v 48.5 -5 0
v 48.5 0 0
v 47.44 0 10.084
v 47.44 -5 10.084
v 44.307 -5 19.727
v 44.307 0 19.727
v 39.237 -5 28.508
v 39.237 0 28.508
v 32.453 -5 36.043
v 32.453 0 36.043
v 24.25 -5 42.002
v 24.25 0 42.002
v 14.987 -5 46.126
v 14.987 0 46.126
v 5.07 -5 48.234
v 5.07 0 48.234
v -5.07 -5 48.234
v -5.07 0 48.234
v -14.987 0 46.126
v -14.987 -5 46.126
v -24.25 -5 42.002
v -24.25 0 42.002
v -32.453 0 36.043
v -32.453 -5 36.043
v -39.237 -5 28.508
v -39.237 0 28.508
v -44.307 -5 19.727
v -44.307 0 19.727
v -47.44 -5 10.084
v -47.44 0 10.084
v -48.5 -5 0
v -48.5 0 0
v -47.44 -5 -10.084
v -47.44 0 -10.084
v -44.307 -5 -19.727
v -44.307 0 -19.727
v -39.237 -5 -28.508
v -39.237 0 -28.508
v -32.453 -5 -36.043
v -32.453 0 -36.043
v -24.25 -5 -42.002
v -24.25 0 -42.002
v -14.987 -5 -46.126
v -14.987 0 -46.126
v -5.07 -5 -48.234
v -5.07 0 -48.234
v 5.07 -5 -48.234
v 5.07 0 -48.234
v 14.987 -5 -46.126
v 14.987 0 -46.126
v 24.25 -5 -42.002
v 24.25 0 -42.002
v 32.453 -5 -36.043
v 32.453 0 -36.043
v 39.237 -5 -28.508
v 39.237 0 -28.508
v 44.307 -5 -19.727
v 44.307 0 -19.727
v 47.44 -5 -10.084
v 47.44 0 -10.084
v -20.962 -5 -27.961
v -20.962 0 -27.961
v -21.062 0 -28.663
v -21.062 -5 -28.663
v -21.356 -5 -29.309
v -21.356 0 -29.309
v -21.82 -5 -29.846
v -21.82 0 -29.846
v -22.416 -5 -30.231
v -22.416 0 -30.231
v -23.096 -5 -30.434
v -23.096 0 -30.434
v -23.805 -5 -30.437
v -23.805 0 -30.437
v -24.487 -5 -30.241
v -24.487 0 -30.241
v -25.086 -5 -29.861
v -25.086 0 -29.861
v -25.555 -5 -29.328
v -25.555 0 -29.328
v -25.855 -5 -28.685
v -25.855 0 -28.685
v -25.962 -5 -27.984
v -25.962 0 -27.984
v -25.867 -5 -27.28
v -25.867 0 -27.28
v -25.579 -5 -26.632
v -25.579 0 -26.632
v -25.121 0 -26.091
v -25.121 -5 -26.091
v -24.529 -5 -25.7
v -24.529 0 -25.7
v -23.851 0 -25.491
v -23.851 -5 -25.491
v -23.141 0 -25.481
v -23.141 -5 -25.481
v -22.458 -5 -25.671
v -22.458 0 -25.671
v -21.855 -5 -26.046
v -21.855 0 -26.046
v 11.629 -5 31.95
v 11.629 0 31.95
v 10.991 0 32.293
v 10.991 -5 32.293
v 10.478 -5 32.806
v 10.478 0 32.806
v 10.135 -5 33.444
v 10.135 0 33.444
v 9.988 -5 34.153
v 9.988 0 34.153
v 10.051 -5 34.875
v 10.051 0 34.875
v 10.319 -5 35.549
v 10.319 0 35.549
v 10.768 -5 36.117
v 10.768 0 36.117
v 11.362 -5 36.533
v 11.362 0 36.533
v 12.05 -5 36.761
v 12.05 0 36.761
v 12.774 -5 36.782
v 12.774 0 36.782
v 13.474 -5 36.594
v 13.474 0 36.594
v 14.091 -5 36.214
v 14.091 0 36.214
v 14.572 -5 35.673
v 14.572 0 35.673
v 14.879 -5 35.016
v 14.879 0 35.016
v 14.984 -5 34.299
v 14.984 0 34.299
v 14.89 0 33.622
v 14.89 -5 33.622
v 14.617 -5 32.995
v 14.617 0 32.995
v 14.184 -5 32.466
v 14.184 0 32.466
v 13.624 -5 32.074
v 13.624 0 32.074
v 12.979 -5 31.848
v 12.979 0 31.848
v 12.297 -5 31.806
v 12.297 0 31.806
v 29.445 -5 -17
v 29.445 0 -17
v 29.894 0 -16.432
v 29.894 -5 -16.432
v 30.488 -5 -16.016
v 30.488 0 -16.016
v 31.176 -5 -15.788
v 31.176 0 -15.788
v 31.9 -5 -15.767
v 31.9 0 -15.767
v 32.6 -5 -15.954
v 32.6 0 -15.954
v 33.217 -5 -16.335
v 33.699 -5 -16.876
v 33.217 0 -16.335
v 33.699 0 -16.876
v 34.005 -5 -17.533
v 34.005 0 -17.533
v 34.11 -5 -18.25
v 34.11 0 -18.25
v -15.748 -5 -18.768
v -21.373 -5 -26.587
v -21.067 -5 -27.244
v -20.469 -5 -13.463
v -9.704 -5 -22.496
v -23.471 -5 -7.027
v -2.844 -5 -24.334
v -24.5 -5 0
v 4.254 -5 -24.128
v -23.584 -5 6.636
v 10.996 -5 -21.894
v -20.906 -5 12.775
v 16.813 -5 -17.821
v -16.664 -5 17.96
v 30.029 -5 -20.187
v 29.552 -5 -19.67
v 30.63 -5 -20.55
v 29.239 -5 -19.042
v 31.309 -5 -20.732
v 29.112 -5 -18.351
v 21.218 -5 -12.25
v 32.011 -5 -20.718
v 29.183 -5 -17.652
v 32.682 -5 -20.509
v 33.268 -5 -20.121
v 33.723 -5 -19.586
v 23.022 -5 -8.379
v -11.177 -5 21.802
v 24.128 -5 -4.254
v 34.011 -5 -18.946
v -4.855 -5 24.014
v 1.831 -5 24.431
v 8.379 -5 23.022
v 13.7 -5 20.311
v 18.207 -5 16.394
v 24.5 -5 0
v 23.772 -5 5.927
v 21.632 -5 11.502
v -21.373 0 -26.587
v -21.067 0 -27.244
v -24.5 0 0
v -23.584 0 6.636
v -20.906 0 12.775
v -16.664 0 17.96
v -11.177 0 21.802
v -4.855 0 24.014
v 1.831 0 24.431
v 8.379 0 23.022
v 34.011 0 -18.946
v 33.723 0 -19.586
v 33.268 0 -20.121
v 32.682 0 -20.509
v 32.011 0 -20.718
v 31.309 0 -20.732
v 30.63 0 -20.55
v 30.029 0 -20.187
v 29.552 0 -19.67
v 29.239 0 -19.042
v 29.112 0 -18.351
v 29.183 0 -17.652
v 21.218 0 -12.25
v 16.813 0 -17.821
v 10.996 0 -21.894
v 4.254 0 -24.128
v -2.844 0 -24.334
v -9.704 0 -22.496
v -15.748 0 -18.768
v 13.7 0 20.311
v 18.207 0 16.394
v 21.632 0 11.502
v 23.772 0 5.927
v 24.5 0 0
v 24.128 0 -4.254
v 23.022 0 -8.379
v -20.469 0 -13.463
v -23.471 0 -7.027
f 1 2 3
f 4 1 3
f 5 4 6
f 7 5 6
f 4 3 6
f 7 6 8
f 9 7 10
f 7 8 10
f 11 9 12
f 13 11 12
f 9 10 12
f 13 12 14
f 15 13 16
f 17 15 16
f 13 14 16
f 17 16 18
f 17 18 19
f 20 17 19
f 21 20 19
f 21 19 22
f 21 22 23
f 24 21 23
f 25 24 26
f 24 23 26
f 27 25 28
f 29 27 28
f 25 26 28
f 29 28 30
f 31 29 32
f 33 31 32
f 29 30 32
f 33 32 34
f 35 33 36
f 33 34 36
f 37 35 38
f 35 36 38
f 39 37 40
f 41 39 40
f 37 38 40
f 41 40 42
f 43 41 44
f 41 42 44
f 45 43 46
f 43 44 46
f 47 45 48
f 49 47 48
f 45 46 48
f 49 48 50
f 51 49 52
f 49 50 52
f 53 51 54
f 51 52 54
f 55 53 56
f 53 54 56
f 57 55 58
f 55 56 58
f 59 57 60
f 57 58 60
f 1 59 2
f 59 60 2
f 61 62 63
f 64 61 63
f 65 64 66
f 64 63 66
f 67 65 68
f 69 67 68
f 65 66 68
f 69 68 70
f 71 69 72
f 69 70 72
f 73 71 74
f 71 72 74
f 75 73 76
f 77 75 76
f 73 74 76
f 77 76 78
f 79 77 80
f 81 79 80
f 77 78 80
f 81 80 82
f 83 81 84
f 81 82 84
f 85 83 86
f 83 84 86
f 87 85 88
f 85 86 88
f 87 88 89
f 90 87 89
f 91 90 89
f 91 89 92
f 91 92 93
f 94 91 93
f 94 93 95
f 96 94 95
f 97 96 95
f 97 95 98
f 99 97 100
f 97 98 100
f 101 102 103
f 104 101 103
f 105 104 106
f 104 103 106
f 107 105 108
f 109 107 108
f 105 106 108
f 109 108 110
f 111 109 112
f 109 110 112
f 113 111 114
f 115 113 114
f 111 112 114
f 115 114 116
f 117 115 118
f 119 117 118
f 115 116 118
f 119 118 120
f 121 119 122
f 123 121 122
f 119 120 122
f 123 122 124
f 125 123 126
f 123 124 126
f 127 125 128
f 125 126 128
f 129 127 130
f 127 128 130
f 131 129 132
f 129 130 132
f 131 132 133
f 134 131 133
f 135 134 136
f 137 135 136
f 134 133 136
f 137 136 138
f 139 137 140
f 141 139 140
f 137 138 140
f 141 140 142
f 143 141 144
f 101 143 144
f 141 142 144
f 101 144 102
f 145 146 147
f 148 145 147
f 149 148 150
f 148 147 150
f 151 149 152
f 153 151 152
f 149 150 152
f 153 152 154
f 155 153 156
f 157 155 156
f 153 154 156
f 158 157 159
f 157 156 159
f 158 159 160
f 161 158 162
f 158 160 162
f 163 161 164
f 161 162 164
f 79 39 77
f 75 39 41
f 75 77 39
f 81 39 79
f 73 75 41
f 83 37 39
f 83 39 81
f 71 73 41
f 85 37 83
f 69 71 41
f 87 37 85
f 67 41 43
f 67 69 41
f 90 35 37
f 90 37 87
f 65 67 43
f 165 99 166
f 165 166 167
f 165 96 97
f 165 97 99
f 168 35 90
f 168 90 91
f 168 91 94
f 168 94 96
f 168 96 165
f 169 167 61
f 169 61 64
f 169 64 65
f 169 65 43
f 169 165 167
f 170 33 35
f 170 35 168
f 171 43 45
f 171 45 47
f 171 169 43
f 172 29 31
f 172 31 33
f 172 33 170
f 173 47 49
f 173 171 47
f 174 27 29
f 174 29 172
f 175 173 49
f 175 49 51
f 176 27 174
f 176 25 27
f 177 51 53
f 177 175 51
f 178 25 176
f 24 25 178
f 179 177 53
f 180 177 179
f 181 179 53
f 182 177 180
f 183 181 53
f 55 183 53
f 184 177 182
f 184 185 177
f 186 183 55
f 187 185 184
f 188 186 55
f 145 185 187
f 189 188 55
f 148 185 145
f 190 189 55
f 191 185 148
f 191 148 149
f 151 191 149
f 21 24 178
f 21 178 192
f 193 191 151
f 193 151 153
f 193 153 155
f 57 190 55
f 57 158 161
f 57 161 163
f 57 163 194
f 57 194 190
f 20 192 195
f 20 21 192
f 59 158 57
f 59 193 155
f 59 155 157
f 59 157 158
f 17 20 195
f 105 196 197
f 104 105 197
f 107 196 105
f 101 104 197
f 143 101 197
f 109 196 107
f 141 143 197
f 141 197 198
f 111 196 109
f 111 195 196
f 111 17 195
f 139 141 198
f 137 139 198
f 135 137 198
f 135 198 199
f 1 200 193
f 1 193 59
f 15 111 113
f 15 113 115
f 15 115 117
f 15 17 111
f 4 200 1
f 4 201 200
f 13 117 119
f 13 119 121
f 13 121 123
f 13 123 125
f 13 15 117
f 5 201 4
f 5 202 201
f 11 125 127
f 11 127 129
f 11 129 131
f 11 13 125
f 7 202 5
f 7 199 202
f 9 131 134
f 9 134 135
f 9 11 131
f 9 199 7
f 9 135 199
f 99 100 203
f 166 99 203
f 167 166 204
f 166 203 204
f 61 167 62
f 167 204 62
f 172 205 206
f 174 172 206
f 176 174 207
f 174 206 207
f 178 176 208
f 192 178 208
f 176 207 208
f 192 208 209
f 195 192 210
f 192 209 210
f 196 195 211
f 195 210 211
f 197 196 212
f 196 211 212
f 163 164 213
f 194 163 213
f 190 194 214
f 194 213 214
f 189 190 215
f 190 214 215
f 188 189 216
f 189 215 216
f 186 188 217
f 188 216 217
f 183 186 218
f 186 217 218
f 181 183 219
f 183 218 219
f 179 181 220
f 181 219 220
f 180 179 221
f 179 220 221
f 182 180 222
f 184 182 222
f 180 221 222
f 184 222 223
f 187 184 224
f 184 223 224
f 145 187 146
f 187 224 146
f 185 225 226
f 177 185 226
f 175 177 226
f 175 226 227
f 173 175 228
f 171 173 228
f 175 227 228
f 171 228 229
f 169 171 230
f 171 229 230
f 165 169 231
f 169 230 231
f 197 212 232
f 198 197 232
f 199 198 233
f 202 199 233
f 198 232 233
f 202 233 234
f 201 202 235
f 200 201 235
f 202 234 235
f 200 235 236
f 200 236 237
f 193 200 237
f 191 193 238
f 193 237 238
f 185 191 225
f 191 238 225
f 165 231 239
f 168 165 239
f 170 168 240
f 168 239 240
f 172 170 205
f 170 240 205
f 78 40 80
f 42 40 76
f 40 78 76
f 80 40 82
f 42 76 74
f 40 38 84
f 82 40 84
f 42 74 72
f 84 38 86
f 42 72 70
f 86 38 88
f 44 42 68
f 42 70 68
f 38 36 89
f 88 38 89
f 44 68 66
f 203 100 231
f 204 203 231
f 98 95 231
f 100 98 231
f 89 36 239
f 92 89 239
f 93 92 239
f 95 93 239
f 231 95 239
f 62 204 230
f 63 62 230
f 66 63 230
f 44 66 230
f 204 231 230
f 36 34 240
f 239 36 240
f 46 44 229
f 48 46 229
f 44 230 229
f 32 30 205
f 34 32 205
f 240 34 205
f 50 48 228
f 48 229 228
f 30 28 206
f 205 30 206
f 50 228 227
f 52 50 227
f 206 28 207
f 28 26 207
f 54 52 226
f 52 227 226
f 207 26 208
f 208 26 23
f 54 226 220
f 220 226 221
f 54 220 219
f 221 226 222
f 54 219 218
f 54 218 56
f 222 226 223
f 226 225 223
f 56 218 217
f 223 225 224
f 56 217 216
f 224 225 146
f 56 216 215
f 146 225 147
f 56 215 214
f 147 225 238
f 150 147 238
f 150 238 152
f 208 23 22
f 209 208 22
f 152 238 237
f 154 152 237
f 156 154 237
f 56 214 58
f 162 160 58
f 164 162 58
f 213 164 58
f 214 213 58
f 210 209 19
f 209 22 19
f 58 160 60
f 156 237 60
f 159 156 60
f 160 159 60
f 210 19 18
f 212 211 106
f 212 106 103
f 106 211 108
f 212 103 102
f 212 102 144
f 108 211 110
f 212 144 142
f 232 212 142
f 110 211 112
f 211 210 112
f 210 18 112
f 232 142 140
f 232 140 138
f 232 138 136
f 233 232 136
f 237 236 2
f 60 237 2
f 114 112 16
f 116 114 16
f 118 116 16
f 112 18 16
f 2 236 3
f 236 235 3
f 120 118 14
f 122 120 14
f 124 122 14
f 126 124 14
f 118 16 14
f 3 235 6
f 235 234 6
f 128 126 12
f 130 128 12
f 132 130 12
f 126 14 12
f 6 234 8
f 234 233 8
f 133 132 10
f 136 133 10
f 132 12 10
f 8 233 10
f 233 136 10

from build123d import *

# Parameters (mm, degrees)
F0_R     = 48.5
F1_DEPTH = 5


with BuildPart() as f1:
    # F0 (on Front) → F1 (new body)
    with BuildSketch(Plane.XZ):
        Circle(F0_R)
        with BuildLine():
            ThreePointArc((-20.961748, -27.960622), (-25.727517, -29.017168), (-21.854779, -26.045511))
            ThreePointArc((-21.854779, -26.045511), (-21.195978, -26.904077), (-20.961748, -27.960622))
        make_face(mode=Mode.SUBTRACT)
        with BuildLine():
            ThreePointArc((34.109927, -18.25), (30.96288, -20.664815), (29.444864, -17))
            ThreePointArc((29.444864, -17), (32.256975, -15.835185), (34.109927, -18.25))
        make_face(mode=Mode.SUBTRACT)
        with BuildLine():
            ThreePointArc((-15.748296, -18.768089), (-22.204541, -10.354147), (-24.5, 0))
            ThreePointArc((-24.5, 0), (-14.052623, 20.069225), (8.379494, 23.022469))
            ThreePointArc((8.379494, 23.022469), (20.069225, 14.052623), (24.5, 0))
            ThreePointArc((24.5, 0), (23.665183, -6.341067), (21.217622, -12.25))
            ThreePointArc((21.217622, -12.25), (4.25438, -24.12779), (-15.748296, -18.768089))
        make_face(mode=Mode.SUBTRACT)
        with BuildLine():
            ThreePointArc((14.983735, 34.298781), (13.917676, 32.250901), (11.628685, 31.949549))
            ThreePointArc((11.628685, 31.949549), (11.049794, 36.346661), (14.983735, 34.298781))
        make_face(mode=Mode.SUBTRACT)
    extrude(amount=F1_DEPTH)


solid = f1.part
